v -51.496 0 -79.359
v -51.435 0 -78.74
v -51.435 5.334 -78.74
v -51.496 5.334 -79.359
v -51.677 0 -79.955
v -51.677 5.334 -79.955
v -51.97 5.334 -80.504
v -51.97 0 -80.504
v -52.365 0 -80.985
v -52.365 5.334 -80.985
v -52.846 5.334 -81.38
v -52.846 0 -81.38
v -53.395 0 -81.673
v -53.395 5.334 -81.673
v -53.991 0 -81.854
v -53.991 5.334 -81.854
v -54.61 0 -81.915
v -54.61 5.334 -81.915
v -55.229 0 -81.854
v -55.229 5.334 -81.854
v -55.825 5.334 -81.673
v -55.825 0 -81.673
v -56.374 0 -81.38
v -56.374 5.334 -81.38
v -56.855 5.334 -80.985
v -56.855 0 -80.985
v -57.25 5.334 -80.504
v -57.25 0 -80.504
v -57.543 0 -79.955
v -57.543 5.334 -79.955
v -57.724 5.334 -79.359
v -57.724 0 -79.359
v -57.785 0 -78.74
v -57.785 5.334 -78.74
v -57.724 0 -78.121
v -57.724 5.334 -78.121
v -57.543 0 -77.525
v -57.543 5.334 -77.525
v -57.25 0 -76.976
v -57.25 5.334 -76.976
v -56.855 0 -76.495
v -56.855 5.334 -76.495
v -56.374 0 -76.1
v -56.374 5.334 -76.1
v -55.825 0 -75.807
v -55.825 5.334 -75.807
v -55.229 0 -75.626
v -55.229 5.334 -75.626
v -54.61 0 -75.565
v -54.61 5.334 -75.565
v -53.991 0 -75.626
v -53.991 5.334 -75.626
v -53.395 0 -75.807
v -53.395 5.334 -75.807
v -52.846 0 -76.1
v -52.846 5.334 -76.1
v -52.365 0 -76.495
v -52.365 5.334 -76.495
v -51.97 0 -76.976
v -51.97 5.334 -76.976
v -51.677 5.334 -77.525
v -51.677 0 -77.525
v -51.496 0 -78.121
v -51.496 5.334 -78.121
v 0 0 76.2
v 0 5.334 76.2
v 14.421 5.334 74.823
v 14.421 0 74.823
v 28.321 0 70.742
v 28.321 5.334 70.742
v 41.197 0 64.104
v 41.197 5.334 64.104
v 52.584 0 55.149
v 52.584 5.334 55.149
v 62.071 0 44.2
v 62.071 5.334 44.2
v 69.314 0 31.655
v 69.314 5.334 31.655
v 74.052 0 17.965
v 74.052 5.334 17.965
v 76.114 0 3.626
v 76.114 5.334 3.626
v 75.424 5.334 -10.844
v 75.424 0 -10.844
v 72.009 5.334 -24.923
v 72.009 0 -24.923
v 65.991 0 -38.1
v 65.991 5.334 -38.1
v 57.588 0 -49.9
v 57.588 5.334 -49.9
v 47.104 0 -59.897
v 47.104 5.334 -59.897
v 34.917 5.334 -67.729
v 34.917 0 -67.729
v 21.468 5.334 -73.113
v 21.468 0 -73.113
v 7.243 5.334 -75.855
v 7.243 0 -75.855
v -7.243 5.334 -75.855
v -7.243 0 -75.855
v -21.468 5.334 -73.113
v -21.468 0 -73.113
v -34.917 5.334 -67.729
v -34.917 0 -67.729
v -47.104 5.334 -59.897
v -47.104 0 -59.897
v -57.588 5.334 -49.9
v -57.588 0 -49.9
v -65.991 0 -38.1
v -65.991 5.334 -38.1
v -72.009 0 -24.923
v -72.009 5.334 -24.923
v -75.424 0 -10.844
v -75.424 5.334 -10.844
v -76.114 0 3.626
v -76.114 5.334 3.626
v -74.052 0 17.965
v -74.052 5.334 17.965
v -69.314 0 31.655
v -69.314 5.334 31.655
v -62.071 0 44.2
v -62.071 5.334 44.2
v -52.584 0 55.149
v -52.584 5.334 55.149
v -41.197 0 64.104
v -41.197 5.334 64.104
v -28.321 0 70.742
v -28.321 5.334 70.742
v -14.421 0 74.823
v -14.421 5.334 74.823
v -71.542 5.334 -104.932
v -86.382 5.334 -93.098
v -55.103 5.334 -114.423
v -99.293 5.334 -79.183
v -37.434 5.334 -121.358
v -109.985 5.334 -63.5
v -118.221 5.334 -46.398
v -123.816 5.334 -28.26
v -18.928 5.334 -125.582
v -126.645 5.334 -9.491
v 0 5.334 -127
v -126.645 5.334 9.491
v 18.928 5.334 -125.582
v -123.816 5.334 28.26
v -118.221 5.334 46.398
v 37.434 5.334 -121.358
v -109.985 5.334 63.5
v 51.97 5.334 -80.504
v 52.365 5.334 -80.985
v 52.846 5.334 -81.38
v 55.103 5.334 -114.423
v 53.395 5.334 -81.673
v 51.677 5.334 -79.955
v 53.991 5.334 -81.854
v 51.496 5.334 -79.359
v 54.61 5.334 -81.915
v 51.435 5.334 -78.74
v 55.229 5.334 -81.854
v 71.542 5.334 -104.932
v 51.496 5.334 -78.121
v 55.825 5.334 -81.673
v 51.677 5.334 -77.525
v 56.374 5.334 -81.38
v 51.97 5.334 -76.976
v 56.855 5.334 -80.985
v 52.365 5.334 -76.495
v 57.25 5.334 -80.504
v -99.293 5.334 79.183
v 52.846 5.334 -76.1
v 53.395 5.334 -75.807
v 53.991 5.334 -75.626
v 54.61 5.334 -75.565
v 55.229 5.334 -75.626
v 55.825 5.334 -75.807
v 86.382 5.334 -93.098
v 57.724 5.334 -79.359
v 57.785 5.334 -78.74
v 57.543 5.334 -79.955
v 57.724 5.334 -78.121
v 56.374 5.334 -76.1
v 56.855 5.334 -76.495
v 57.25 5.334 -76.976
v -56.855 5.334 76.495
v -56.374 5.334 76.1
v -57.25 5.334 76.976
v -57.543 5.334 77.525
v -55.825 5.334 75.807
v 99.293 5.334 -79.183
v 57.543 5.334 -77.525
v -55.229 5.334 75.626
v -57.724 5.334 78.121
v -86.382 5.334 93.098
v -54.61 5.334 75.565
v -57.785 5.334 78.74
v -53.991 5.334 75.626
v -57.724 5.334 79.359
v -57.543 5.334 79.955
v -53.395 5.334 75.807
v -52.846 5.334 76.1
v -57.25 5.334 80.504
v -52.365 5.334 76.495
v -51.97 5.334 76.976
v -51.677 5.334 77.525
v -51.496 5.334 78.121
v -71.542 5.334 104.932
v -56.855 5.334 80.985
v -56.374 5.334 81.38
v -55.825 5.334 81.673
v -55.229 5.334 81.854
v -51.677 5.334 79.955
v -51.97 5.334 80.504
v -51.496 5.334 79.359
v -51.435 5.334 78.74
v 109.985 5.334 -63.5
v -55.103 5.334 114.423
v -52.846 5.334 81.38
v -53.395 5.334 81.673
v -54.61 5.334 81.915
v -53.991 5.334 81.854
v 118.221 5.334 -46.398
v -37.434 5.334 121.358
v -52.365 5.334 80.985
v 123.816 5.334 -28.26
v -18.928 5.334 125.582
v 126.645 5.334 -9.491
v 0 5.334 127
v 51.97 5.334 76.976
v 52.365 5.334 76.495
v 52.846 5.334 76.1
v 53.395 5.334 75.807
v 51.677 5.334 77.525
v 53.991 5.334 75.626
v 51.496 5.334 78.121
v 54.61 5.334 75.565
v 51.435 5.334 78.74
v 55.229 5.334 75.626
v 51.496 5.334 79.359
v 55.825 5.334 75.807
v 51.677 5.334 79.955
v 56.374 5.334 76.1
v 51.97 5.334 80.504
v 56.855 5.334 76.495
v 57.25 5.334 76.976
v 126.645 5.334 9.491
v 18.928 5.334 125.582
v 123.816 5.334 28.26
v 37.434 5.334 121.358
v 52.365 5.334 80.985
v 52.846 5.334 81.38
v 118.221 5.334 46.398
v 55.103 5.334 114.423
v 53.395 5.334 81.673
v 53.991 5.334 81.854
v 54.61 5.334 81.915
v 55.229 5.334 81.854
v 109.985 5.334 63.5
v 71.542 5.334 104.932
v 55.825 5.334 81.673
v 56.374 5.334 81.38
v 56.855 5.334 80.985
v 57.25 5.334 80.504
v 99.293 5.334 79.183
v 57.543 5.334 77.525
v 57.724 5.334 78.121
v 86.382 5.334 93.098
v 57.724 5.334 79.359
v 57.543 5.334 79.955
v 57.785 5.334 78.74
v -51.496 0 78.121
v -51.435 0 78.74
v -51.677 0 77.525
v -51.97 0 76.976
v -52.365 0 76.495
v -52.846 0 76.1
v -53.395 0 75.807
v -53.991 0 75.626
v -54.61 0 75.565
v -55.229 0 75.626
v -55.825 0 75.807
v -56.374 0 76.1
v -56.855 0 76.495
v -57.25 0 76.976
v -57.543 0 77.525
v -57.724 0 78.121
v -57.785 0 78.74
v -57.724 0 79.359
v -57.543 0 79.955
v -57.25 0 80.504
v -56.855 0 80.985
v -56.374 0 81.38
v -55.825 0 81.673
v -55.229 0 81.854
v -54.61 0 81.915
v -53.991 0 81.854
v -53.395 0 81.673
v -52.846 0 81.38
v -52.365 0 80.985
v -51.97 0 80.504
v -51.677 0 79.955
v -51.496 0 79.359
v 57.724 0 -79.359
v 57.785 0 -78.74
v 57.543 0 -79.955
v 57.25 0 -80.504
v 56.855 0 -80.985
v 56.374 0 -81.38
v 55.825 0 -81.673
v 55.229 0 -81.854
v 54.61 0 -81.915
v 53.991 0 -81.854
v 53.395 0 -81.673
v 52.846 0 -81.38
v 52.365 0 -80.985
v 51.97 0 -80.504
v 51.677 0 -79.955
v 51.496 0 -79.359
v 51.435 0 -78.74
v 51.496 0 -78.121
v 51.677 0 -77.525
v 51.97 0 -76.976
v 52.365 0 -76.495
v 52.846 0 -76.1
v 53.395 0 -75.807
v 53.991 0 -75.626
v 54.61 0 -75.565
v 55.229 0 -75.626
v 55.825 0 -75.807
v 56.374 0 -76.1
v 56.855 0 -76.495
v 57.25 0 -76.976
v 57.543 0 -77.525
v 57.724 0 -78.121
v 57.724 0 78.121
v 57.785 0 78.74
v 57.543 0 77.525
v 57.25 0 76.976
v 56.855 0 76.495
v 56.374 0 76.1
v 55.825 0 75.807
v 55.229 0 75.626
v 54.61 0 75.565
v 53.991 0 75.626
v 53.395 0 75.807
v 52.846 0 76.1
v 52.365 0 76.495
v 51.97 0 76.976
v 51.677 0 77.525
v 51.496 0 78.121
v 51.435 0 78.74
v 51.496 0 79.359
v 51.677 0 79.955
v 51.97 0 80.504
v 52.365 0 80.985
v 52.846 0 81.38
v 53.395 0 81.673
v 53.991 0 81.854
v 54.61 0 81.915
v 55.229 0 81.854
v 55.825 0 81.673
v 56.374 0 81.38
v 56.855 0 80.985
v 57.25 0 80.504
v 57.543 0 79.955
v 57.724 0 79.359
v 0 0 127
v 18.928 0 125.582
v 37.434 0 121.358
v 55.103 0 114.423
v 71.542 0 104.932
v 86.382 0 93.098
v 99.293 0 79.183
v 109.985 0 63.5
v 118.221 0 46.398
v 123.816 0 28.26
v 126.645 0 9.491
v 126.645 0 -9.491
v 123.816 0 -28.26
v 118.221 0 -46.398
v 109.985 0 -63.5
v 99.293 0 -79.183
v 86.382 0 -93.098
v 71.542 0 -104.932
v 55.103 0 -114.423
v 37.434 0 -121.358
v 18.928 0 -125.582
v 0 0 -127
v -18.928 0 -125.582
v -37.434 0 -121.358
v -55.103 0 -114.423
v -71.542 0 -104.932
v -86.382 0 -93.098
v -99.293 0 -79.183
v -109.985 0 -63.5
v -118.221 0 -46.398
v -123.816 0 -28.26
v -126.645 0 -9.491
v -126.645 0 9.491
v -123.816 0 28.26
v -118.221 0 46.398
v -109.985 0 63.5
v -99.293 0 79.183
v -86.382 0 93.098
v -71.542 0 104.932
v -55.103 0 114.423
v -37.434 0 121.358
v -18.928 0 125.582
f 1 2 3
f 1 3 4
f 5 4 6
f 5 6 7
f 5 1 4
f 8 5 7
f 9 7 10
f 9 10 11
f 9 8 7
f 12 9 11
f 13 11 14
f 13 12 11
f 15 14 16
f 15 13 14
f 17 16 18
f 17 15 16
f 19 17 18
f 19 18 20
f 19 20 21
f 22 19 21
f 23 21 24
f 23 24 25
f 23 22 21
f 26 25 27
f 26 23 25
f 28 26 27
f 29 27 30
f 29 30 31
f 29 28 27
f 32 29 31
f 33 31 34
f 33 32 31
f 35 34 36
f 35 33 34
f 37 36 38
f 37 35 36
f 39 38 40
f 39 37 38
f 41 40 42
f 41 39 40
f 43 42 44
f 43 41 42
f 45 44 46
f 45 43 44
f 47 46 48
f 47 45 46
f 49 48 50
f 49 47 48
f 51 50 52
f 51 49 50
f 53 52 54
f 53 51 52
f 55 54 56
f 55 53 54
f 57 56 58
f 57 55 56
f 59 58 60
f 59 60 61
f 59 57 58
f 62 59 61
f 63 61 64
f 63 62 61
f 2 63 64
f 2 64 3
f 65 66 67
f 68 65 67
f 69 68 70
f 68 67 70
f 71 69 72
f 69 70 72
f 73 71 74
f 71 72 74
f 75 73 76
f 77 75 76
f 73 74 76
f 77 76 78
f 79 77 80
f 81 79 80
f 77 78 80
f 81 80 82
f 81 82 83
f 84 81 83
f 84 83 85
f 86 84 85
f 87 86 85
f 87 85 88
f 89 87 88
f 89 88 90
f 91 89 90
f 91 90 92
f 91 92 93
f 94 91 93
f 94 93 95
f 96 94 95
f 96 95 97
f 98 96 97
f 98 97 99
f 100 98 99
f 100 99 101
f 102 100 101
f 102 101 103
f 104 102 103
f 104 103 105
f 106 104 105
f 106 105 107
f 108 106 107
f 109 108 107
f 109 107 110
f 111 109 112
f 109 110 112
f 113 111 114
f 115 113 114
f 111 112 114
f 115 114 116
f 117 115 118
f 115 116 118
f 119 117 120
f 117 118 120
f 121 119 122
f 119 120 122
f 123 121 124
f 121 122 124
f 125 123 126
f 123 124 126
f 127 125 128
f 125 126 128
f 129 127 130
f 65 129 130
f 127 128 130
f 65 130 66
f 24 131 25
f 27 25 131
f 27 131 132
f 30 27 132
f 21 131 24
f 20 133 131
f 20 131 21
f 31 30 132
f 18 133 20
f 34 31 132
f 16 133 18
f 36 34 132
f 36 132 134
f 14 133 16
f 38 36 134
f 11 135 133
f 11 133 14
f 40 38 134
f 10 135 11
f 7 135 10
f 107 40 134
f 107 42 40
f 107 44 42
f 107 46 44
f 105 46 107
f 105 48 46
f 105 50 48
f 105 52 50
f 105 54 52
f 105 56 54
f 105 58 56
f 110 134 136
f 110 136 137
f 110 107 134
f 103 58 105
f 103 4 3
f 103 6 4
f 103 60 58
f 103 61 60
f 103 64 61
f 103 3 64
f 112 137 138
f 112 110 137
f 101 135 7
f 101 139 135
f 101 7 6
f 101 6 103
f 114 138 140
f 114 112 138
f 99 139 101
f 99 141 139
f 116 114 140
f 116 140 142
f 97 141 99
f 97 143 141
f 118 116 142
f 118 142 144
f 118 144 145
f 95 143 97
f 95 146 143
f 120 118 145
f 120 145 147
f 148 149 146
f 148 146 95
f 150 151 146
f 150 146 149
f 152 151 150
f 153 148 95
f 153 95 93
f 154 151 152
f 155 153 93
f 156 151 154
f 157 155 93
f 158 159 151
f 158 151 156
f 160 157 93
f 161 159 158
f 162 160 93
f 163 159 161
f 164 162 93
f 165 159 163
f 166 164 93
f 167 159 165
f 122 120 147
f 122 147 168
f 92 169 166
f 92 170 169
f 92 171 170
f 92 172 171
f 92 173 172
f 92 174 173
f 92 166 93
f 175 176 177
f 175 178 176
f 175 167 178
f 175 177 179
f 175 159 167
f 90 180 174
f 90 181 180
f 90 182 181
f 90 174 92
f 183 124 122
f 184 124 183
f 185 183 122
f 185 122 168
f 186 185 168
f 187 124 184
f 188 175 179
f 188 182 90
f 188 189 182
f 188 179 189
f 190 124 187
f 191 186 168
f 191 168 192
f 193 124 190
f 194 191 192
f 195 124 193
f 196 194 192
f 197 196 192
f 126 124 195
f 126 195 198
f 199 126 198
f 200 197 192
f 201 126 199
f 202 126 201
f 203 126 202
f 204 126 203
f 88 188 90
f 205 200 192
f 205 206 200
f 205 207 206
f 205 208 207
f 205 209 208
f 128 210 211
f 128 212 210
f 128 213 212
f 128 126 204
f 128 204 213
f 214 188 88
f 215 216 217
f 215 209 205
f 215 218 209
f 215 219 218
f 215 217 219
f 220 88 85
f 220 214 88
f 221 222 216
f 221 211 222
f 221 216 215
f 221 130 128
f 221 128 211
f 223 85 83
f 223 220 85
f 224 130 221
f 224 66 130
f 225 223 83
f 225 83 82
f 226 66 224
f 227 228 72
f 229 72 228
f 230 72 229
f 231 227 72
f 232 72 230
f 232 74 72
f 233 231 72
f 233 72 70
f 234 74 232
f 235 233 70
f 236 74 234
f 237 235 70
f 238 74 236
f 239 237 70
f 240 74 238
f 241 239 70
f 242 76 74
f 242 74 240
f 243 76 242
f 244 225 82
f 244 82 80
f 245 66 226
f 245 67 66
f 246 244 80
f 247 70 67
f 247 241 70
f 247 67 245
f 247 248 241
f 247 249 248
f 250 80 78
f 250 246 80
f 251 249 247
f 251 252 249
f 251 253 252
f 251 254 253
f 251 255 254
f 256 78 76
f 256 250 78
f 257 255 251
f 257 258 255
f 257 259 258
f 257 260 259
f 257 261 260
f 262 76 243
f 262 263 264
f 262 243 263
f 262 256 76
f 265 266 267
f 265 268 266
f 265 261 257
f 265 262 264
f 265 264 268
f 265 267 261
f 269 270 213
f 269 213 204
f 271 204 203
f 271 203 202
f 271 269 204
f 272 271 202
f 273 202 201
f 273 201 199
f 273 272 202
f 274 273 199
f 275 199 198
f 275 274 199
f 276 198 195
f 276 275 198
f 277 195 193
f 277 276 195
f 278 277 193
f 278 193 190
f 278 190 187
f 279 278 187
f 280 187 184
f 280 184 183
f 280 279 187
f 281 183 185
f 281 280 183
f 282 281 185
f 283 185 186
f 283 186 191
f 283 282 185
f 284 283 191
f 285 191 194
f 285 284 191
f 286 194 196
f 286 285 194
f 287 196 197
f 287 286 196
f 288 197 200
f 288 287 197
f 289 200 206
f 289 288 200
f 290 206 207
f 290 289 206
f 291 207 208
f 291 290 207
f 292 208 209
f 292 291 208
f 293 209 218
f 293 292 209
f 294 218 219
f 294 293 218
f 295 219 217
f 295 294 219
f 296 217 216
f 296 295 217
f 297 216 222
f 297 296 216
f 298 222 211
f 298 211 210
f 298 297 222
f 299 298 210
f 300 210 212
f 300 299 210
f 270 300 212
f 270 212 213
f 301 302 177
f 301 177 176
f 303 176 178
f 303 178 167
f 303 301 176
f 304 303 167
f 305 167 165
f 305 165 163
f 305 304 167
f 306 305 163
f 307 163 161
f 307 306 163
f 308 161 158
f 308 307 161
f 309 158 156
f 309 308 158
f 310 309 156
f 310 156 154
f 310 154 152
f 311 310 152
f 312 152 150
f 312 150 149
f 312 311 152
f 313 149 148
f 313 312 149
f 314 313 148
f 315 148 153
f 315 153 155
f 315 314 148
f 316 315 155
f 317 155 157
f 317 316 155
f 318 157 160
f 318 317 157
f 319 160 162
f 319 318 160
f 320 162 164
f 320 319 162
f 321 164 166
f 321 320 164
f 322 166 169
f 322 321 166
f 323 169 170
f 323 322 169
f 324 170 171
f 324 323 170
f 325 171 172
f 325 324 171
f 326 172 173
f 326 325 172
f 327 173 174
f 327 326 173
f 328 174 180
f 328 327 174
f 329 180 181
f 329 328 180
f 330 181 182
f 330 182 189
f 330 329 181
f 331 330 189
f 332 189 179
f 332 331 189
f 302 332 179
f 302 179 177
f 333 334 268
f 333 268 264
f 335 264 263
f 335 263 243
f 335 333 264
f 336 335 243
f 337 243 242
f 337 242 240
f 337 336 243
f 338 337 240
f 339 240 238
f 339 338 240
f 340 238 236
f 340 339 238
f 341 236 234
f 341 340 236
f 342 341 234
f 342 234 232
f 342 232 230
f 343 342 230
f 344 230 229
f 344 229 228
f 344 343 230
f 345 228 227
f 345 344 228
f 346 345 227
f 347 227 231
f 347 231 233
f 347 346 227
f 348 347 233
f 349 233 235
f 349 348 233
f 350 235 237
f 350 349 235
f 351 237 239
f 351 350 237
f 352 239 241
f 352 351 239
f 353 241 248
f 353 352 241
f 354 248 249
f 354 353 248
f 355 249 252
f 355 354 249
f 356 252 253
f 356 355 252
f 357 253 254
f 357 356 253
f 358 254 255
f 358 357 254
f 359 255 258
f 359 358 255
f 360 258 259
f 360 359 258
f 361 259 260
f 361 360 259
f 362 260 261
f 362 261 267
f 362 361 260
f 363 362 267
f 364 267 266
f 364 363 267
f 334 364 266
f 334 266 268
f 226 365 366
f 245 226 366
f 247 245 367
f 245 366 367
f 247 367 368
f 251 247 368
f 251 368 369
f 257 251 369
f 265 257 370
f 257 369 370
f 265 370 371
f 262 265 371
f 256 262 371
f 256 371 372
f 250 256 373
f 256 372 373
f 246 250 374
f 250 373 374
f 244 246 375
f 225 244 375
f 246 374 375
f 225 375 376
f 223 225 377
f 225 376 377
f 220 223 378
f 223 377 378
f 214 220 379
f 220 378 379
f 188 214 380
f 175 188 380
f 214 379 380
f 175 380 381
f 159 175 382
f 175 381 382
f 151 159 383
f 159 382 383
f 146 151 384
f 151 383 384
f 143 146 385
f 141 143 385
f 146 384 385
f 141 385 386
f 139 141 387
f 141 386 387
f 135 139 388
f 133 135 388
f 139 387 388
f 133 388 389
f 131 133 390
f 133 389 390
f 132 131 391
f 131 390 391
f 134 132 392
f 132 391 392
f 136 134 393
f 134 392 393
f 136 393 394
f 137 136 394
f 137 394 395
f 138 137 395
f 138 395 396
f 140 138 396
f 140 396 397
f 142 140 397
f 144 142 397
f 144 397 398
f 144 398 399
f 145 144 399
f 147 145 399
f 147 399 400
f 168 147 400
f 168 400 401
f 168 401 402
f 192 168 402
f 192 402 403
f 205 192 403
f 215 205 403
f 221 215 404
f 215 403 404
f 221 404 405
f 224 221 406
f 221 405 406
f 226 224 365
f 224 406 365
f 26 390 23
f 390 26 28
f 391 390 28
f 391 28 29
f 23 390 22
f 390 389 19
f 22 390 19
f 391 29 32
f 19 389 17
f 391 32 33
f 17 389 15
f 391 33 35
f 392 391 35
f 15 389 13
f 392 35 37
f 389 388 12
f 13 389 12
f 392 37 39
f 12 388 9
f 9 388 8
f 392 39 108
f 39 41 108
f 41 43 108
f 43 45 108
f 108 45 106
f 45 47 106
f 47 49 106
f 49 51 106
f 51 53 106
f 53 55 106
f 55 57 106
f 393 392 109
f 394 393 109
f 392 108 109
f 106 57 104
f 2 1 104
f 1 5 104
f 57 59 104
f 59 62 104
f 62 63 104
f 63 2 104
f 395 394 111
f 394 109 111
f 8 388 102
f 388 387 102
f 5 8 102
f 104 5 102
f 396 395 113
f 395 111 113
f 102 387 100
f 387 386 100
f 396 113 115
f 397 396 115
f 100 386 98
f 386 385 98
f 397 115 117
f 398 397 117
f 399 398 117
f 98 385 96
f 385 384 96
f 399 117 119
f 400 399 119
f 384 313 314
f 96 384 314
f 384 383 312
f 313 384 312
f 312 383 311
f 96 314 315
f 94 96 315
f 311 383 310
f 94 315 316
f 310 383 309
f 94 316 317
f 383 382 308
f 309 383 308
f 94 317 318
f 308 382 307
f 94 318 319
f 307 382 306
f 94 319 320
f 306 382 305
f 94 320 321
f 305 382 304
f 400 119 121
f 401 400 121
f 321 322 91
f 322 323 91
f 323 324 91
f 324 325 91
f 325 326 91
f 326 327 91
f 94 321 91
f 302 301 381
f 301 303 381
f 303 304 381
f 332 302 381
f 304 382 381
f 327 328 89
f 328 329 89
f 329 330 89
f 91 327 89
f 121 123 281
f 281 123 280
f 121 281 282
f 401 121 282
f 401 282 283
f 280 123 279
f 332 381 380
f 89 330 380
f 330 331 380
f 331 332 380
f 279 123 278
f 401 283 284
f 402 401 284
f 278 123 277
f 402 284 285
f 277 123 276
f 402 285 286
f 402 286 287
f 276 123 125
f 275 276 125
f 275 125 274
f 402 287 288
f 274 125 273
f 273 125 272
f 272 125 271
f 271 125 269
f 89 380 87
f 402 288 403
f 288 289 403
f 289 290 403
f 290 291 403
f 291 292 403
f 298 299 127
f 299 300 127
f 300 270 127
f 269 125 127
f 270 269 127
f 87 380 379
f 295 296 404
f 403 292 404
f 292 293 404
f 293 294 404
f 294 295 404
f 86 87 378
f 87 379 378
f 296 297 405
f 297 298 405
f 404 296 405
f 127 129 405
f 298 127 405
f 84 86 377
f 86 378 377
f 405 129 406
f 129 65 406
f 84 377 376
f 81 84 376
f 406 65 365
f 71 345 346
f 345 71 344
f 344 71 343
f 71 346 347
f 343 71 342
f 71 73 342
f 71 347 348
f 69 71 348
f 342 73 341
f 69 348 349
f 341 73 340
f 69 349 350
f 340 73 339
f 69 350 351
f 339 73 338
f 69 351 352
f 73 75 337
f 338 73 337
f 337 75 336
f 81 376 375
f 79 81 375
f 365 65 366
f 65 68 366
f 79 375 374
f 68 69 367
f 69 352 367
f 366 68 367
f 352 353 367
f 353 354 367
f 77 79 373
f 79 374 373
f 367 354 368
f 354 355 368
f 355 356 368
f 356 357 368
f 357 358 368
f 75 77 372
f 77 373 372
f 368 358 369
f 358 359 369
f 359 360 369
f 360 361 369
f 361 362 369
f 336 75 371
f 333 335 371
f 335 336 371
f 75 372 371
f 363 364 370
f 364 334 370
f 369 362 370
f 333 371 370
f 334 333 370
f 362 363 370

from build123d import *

# Parameters (mm, degrees)
SKETCH1_R          = 127
BASE_DEPTH         = 5.334
SKETCH2_R          = 76.2
CUT_EXTRUDE1_DEPTH = 180.684310823
HOLE2_OUTLINE_R    = 3.175
HOLE2_DEPTH        = 5.334


# Read off the part's stored shape, not the designer's step: Hole2
with BuildPart() as part:
    # Sketch1 → Base (new body)
    with BuildSketch(Plane(origin=(0, 0, 0), x_dir=(1, 0, 0), z_dir=(0, 1, 0))):
        with Locations(Location((0, 0, 0), (0, 0, 270))):
            Circle(SKETCH1_R)
    extrude(amount=BASE_DEPTH)

    # Sketch2 → Cut-Extrude1 (cut, through all)
    with BuildSketch(Plane(origin=(0, 5.334, 0), x_dir=(1, 0, 0), z_dir=(0, 1, 0))):
        with Locations(Location((0, 0, 0), (0, 0, 270))):
            Circle(SKETCH2_R)
    extrude(amount=-CUT_EXTRUDE1_DEPTH, mode=Mode.SUBTRACT)

    # Hole2 outline → Hole2 (cut)
    with BuildSketch(Plane(origin=(0, 0, 0), x_dir=(1, 0, 0), z_dir=(0, 1, 0))):
        with Locations((-54.61, -78.74)):
            Circle(HOLE2_OUTLINE_R)
        with Locations((54.61, -78.74)):
            Circle(HOLE2_OUTLINE_R)
        with Locations((54.61, 78.74)):
            Circle(HOLE2_OUTLINE_R)
        with Locations((-54.61, 78.74)):
            Circle(HOLE2_OUTLINE_R)
    extrude(amount=HOLE2_DEPTH, mode=Mode.SUBTRACT)


solid = part.part
